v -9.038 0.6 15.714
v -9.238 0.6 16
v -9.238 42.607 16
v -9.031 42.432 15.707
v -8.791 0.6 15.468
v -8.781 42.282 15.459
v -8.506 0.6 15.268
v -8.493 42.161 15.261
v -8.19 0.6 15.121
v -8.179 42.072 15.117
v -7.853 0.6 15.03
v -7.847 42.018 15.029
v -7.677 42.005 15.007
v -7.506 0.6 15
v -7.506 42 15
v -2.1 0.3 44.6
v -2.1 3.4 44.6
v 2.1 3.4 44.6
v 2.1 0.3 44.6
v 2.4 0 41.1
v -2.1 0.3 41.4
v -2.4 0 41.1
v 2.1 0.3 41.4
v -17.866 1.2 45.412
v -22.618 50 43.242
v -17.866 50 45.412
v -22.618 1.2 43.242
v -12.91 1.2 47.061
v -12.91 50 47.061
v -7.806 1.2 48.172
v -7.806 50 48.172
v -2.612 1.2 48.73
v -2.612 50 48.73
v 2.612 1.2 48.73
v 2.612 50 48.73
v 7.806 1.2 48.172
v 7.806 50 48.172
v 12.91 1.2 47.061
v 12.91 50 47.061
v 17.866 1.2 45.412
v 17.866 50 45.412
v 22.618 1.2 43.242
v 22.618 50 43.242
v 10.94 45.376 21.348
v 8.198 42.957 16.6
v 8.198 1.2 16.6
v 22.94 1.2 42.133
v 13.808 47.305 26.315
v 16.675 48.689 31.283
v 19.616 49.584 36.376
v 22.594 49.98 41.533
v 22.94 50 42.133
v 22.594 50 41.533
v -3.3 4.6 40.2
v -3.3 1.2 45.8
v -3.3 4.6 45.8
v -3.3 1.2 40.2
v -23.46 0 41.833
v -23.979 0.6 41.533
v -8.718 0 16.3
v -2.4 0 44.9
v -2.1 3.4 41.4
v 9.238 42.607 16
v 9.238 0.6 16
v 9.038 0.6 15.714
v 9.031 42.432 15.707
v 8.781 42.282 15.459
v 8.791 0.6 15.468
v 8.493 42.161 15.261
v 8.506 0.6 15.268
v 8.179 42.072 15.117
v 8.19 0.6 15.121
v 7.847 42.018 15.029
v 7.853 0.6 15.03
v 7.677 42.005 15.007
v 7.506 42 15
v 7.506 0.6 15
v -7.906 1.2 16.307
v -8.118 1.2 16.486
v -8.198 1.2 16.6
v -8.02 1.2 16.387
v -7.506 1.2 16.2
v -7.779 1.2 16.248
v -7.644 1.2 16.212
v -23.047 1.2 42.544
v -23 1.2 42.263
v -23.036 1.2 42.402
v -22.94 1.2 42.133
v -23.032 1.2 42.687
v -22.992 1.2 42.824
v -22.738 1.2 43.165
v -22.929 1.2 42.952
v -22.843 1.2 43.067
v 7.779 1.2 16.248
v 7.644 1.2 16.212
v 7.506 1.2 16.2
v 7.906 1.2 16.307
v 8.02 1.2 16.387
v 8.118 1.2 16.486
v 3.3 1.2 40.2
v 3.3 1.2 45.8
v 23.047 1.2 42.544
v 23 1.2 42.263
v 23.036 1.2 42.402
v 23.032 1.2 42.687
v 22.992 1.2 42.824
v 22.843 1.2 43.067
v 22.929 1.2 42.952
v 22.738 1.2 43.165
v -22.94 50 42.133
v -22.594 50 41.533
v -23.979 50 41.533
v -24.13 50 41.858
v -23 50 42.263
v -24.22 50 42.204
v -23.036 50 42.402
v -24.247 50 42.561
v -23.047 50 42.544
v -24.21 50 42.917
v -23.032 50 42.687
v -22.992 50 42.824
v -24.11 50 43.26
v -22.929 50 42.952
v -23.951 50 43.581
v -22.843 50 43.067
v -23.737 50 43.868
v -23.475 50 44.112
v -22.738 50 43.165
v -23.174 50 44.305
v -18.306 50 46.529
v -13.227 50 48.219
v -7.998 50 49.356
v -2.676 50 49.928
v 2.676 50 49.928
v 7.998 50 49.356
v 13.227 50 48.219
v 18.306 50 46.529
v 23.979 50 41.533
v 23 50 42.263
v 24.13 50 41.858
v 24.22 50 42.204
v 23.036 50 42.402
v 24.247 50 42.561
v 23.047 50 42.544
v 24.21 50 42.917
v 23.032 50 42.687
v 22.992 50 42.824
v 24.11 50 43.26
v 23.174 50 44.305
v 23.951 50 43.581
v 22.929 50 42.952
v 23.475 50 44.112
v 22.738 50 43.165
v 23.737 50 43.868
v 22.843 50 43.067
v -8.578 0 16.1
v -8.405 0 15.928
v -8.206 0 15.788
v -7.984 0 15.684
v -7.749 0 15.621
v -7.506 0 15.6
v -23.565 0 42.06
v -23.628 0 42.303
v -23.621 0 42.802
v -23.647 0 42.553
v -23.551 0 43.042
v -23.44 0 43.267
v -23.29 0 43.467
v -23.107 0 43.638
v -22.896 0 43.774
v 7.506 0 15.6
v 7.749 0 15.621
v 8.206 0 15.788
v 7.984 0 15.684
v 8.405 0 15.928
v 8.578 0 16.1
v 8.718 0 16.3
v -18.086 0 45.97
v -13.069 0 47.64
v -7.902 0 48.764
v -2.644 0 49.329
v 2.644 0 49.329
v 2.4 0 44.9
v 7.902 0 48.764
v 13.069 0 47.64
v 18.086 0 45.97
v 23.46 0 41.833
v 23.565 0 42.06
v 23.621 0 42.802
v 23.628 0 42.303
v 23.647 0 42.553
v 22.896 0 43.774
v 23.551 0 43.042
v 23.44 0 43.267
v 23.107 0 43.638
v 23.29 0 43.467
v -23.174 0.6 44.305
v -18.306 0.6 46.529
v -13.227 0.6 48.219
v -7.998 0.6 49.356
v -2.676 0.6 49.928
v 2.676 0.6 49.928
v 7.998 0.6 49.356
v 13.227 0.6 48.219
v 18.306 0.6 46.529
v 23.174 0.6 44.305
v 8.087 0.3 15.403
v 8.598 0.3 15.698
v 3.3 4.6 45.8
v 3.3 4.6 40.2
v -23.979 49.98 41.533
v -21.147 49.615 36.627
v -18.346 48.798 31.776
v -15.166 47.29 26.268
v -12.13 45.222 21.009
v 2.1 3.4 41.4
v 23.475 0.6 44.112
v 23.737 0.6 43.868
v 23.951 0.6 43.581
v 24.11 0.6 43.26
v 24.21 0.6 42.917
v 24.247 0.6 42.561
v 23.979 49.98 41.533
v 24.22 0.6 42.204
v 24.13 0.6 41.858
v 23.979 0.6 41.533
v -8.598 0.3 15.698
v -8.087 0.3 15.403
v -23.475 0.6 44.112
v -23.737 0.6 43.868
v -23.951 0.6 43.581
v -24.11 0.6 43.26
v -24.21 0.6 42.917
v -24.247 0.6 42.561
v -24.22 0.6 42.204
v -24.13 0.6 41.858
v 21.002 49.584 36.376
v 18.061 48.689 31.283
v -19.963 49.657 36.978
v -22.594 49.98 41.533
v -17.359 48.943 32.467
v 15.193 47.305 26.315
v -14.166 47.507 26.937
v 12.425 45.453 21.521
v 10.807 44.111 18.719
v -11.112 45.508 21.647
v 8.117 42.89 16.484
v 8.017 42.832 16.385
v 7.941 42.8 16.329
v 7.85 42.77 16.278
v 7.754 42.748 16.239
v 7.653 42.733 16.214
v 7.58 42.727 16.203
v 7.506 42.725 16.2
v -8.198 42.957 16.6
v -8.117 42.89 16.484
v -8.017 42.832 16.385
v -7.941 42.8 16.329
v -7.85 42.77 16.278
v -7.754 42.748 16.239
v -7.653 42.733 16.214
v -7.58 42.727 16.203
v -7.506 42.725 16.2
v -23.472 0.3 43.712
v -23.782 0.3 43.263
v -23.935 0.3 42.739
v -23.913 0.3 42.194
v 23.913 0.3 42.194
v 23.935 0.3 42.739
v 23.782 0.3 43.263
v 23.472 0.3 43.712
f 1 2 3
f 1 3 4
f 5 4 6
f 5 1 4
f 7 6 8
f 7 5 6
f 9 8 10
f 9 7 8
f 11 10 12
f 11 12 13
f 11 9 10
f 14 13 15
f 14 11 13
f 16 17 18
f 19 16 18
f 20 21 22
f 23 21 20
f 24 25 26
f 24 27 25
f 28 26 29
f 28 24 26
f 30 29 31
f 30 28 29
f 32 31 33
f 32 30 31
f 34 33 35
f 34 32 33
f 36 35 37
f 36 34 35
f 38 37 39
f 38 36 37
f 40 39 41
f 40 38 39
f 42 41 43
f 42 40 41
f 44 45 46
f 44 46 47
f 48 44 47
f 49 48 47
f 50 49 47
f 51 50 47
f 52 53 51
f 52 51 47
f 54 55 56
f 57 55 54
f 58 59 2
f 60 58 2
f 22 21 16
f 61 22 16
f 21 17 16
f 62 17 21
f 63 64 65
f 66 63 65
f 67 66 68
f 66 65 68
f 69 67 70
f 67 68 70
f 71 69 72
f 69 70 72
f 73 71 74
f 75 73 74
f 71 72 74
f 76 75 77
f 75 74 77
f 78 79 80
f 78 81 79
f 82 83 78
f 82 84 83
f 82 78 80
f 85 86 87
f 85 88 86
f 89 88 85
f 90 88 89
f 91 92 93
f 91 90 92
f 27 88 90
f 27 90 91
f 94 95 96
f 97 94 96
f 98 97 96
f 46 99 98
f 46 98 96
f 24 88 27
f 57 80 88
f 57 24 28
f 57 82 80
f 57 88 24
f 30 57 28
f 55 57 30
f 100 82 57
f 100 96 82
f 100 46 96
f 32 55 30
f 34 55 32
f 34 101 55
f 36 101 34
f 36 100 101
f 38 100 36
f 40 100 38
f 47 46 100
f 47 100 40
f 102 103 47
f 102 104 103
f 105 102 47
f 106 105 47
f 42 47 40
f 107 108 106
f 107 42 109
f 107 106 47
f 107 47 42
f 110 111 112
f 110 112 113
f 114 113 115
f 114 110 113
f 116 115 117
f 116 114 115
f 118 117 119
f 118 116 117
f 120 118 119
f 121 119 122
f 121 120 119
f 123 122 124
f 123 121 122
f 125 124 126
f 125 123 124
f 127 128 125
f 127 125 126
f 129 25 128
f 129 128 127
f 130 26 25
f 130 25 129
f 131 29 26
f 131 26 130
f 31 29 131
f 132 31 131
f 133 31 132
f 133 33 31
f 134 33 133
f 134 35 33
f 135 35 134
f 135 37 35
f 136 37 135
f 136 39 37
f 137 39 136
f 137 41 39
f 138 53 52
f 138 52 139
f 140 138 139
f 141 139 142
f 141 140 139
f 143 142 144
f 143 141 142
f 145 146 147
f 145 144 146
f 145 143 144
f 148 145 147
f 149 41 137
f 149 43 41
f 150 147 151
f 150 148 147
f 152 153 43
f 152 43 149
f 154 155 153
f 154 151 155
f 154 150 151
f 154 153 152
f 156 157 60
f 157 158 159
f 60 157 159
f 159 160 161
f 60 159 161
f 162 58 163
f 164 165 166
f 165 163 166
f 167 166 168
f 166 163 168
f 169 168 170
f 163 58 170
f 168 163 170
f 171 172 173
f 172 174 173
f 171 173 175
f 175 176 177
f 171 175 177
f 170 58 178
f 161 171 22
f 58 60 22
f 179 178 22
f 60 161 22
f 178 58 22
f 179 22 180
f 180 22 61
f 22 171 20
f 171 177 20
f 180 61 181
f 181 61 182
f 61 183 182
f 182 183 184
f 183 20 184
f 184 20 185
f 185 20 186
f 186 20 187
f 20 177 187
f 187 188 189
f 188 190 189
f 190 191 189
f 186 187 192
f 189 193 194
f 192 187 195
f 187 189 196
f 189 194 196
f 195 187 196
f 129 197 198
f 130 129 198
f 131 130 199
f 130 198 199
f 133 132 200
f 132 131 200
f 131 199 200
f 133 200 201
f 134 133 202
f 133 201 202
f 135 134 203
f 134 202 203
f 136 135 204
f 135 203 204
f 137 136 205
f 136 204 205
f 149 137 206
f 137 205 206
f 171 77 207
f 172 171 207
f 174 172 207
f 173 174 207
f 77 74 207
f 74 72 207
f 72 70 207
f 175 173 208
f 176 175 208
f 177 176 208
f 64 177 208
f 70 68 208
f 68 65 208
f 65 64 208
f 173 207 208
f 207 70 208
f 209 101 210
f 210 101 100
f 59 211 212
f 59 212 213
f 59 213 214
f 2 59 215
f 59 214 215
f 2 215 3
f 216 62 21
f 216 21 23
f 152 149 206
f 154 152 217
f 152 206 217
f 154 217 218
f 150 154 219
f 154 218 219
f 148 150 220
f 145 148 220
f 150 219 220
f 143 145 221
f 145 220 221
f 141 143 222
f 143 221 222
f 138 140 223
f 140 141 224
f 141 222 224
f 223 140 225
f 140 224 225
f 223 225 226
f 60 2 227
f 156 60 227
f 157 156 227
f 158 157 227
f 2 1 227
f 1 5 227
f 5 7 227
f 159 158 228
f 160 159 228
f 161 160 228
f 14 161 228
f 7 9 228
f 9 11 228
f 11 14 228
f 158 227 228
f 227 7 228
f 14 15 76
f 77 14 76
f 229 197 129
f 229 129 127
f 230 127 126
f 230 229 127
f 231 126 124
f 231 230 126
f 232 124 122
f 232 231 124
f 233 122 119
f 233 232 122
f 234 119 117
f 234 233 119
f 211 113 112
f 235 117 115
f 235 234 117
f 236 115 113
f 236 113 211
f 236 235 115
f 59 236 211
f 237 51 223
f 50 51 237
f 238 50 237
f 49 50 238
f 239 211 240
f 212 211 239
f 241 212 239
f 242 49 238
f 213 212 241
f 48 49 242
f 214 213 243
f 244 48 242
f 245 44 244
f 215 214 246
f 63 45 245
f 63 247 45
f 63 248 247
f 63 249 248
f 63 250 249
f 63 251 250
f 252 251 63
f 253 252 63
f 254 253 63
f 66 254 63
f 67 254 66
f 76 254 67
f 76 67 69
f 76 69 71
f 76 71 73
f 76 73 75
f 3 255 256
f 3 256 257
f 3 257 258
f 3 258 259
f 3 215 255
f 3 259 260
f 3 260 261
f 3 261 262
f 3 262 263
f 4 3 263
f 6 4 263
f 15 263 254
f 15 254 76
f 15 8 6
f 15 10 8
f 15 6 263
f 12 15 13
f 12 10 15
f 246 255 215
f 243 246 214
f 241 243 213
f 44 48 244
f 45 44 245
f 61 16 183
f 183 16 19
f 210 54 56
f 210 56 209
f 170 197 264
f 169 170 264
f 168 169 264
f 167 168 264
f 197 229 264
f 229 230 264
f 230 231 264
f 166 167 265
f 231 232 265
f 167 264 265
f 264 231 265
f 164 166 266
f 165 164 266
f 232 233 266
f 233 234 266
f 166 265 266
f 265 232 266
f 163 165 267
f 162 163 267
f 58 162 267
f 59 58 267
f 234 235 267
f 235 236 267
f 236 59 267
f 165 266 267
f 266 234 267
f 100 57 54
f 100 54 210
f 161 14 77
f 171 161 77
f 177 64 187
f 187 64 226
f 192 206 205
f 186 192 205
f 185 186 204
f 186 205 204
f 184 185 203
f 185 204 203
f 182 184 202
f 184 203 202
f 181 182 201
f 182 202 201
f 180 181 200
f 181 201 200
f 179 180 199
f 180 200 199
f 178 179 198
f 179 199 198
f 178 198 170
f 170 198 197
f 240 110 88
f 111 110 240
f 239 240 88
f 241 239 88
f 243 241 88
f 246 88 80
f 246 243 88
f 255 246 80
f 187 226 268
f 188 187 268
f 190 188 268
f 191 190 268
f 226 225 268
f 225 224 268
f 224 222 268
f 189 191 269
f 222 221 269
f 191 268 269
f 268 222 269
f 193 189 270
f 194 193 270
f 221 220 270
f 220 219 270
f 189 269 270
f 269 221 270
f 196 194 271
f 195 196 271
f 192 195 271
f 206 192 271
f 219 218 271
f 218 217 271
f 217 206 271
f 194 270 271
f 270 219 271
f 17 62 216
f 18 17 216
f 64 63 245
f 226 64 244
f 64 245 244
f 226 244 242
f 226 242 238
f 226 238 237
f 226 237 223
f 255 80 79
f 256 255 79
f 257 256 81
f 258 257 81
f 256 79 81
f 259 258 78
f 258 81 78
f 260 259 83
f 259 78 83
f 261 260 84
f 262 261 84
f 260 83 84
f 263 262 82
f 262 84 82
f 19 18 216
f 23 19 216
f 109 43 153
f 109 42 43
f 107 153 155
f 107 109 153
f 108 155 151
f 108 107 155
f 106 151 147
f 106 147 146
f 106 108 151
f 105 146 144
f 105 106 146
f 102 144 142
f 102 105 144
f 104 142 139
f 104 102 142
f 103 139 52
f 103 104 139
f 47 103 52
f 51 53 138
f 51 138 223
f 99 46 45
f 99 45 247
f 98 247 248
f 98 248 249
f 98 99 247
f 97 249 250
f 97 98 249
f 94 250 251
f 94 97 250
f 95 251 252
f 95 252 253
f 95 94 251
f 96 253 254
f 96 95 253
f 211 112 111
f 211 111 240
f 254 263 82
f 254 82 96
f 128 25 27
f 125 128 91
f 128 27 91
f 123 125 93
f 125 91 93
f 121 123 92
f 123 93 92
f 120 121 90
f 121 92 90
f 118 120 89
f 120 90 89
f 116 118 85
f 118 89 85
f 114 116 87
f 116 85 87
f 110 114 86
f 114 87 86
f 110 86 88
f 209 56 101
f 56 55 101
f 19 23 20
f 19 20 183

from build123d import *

# Parameters (mm, degrees)
SKETCH_1_R               = 50
EXTRUDE_1_DEPTH          = 50
CUT_EXTRUDE_2_DEPTH      = 87.602540378
CUT_EXTRUDE_3_DEPTH      = 76
FILLET_1_R               = 2
CHAMFER_1_SIZE           = 0.6
SHELL_1_T                = -1.2
EXTRUDE_2_DEPTH          = 2
EXTRUDE_2_DEPTH_BACK     = 2
SKETCH_4_R               = 1.5
SKETCH_5_R               = 1.5
EXTRUDE_3_DEPTH          = 3
CUT_EXTRUDE_4_DEPTH      = 75.752405905
CUT_EXTRUDE_4_DEPTH_BACK = 75.752405905
SKETCH_7_W               = 6.6
SKETCH_7_H               = 5.6
SKETCH_7_W_2             = 4
SKETCH_7_H_2             = 3
EXTRUDE_4_DEPTH          = 2.2
SKETCH_8_W               = 4
SKETCH_8_H               = 3
CUT_EXTRUDE_7_DEPTH      = 1.2
SKETCH_9_W               = 48.891646461
SKETCH_9_H               = 14.735047163
CUT_EXTRUDE_8_DEPTH      = 75.752405905
CHAMFER_2_SIZE           = 0.4
SKETCH_10_W              = 4.2
SKETCH_10_H              = 3.2
SKETCH_10_W_2            = 4
SKETCH_10_H_2            = 3
CUT_EXTRUDE_9_DEPTH      = 73.52228753
SKETCH_11_W              = 6.6
SKETCH_11_H              = 5.6
EXTRUDE_5_DEPTH          = 1.2


with BuildPart() as part:
    # 草图1 → 凸台-拉伸1 (new body)
    with BuildSketch(Plane(origin=(0, 0, 0), x_dir=(1, 0, 0), z_dir=(0, 1, 0))):
        with Locations(Location((0, 0, 0), (0, 0, 270))):
            Circle(SKETCH_1_R)
    extrude(amount=EXTRUDE_1_DEPTH)

    # 草图2 → 切除-拉伸2 (cut, through all)
    with BuildSketch(Plane(origin=(0, 50, 0), x_dir=(1, 0, 0), z_dir=(0, 1, 0))):
        with BuildLine():
            Line((-25, -43.301270189), (0, 0))
            Line((0, 0), (25, -43.301270189))
            ThreePointArc((25, -43.301270189), (0, 50), (-25, -43.301270189))
        make_face()
    extrude(amount=-CUT_EXTRUDE_2_DEPTH, mode=Mode.SUBTRACT)

    # 草图3 → 切除-拉伸3 (cut, through all)
    with BuildSketch(Plane(origin=(0, 50, 0), x_dir=(1, 0, 0), z_dir=(0, 1, 0))):
        with BuildLine():
            ThreePointArc((-7.5, -12.990381057), (-3.882285677, -14.488887394), (0, -15))
            ThreePointArc((0, -15), (3.882285677, -14.488887394), (7.5, -12.990381057))
            Line((7.5, -12.990381057), (0, 0))
            Line((0, 0), (-7.5, -12.990381057))
        make_face()
        with BuildLine():
            ThreePointArc((15, 0), (-7.5, 12.990381057), (-7.5, -12.990381057))
            Line((-7.5, -12.990381057), (0, 0))
            Line((0, 0), (7.5, -12.990381057))
            ThreePointArc((7.5, -12.990381057), (12.990381057, -7.5), (15, 0))
        make_face()
        with BuildLine():
            ThreePointArc((7.5, -12.990381057), (3.882285677, -14.488887394), (0, -15))
            Line((0, -15), (8.660254038, -15))
            Line((8.660254038, -15), (7.5, -12.990381057))
        make_face()
        with BuildLine():
            Line((-7.5, -12.990381057), (-8.660254038, -15))
            Line((-8.660254038, -15), (0, -15))
            ThreePointArc((0, -15), (-3.882285677, -14.488887394), (-7.5, -12.990381057))
        make_face()
    extrude(amount=-CUT_EXTRUDE_3_DEPTH, mode=Mode.SUBTRACT)

    # 圆角1
    fillet_1_edges = [part.edges().sort_by_distance(p)[0] for p in [
        (25, 25, 43.301270189),
        (-25, 25, 43.301270189),
        (-8.660254038, 25, 15),
        (8.660254038, 25, 15),
    ]]
    fillet(fillet_1_edges, radius=FILLET_1_R)

    # 倒角1
    chamfer_1_edges = [part.edges().sort_by_distance(p)[0] for p in [
        (0, 0, 15),
        (-16.608380962, 0, 28.766559657),
        (16.608380962, 0, 28.766559657),
        (0, 0, 50),
        (8.505553499, 0, 15.267949192),
        (24.167752526, 0, 43.090900659),
        (-24.167752526, 0, 43.090900659),
        (-8.505553499, 0, 15.267949192),
    ]]
    chamfer(chamfer_1_edges, length=CHAMFER_1_SIZE)

    # 抽壳1
    shell_1_openings = [part.faces().sort_by_distance(p)[0] for p in [
        (0, 50, 34.229276229),
    ]]
    offset(amount=SHELL_1_T, openings=shell_1_openings)

    # 草图4 → 凸台-拉伸2 (add, two sides: drawn at the far end of the back side and taken through both)
    with BuildSketch(Plane(origin=(0, 0, 0), x_dir=(0, 0, -1), z_dir=(1, 0, 0)).offset(-EXTRUDE_2_DEPTH_BACK)):
        with BuildLine():
            Line((-44.5, 0), (-44.5, -3))
            ThreePointArc((-44.5, -3), (-43, -1.5), (-41.5, -3))
            Line((-41.5, -3), (-41.5, 0))
            Line((-41.5, 0), (-44.5, 0))
        make_face()
        with Locations((-43, -3)):
            Circle(SKETCH_4_R)
    extrude(amount=EXTRUDE_2_DEPTH + EXTRUDE_2_DEPTH_BACK)

    # 草图5 → 凸台-拉伸3 (add)
    with BuildSketch(Plane(origin=(2, 0, 0), x_dir=(0, 0, -1), z_dir=(1, 0, 0))):
        with Locations((-43, -3)):
            Circle(SKETCH_5_R)
    extrude_3 = extrude(amount=EXTRUDE_3_DEPTH)

    # 镜向1: 凸台-拉伸3 across plane
    add(extrude_3.mirror(Plane(origin=(0, 0, 0), x_dir=(0, 0, 1), z_dir=(1, 0, 0))))

    # 草图6 → 切除-拉伸4 (cut, two sides: drawn at the far end of the back side and taken through both)
    with BuildSketch(Plane(origin=(0, 0, 0), x_dir=(0, 0, -1), z_dir=(1, 0, 0)).offset(-CUT_EXTRUDE_4_DEPTH_BACK)):
        with BuildLine():
            ThreePointArc((-41.533119315, 49.979696687), (-27.735886723, 47.754377603), (-15, 42))
            Line((-15, 42), (-15, 50))
            Line((-15, 50), (-16, 50))
            Line((-16, 50), (-41.533119315, 50))
            Line((-41.533119315, 50), (-41.533119315, 49.979696687))
        make_face()
    extrude(amount=CUT_EXTRUDE_4_DEPTH + CUT_EXTRUDE_4_DEPTH_BACK, mode=Mode.SUBTRACT)

    # 草图7 → 凸台-拉伸4 (add)
    with BuildSketch(Plane(origin=(0, 1.2, 0), x_dir=(1, 0, 0), z_dir=(0, 1, 0))):
        with Locations((0, -43)):
            Rectangle(SKETCH_7_W, SKETCH_7_H)
        with Locations((0, -43)):
            Rectangle(SKETCH_7_W_2, SKETCH_7_H_2, mode=Mode.SUBTRACT)
    extrude(amount=EXTRUDE_4_DEPTH)

    # 草图8 → 切除-拉伸7 (cut)
    with BuildSketch(Plane(origin=(0, 1.2, 0), x_dir=(1, 0, 0), z_dir=(0, 1, 0))):
        with Locations((0, -43)):
            Rectangle(SKETCH_8_W, SKETCH_8_H)
    extrude(amount=-CUT_EXTRUDE_7_DEPTH, mode=Mode.SUBTRACT)


with BuildPart() as cut_extrude_7_piece_1:
    # of the separate pieces the step leaves, piece 1, a body of its own (cut_extrude_7_pieces)
    add(part.part.solids().sort_by_distance((-23.174069593, 0.6, 44.305332619))[0])

    # 倒角2
    chamfer_2_edges = [cut_extrude_7_piece_1.edges().sort_by_distance(p)[0] for p in [
        (-2, 0, 43),
        (0, 0, 41.5),
        (0, 0, 44.5),
        (2, 0, 43),
    ]]
    chamfer(chamfer_2_edges, length=CHAMFER_2_SIZE)

    # 草图10 → 切除-拉伸9 (cut, through all)
    with BuildSketch(Plane(origin=(0, 3.4, 0), x_dir=(1, 0, 0), z_dir=(0, 1, 0))):
        with Locations((0, -43)):
            Rectangle(SKETCH_10_W, SKETCH_10_H)
        with Locations((0, -43)):
            Rectangle(SKETCH_10_W_2, SKETCH_10_H_2, mode=Mode.SUBTRACT)
    extrude(amount=-CUT_EXTRUDE_9_DEPTH, mode=Mode.SUBTRACT)

    # 草图11 → 凸台-拉伸5 (add)
    with BuildSketch(Plane(origin=(0, 3.4, 0), x_dir=(1, 0, 0), z_dir=(0, 1, 0))):
        with Locations((0, -43)):
            Rectangle(SKETCH_11_W, SKETCH_11_H)
    extrude(amount=EXTRUDE_5_DEPTH)


with BuildPart() as cut_extrude_7_piece_2:
    # of the separate pieces the step leaves, piece 2, a body of its own (cut_extrude_7_pieces)
    add(part.part.solids().sort_by_distance((-2, -3, 41.5))[0])

    # 草图9 → 切除-拉伸8 (cut, through all)
    with BuildSketch(Plane.XZ):
        with Locations((-1.815492917, 42.673305219)):
            Rectangle(SKETCH_9_W, SKETCH_9_H)
    extrude(amount=CUT_EXTRUDE_8_DEPTH, mode=Mode.SUBTRACT)


solid = cut_extrude_7_piece_1.part
